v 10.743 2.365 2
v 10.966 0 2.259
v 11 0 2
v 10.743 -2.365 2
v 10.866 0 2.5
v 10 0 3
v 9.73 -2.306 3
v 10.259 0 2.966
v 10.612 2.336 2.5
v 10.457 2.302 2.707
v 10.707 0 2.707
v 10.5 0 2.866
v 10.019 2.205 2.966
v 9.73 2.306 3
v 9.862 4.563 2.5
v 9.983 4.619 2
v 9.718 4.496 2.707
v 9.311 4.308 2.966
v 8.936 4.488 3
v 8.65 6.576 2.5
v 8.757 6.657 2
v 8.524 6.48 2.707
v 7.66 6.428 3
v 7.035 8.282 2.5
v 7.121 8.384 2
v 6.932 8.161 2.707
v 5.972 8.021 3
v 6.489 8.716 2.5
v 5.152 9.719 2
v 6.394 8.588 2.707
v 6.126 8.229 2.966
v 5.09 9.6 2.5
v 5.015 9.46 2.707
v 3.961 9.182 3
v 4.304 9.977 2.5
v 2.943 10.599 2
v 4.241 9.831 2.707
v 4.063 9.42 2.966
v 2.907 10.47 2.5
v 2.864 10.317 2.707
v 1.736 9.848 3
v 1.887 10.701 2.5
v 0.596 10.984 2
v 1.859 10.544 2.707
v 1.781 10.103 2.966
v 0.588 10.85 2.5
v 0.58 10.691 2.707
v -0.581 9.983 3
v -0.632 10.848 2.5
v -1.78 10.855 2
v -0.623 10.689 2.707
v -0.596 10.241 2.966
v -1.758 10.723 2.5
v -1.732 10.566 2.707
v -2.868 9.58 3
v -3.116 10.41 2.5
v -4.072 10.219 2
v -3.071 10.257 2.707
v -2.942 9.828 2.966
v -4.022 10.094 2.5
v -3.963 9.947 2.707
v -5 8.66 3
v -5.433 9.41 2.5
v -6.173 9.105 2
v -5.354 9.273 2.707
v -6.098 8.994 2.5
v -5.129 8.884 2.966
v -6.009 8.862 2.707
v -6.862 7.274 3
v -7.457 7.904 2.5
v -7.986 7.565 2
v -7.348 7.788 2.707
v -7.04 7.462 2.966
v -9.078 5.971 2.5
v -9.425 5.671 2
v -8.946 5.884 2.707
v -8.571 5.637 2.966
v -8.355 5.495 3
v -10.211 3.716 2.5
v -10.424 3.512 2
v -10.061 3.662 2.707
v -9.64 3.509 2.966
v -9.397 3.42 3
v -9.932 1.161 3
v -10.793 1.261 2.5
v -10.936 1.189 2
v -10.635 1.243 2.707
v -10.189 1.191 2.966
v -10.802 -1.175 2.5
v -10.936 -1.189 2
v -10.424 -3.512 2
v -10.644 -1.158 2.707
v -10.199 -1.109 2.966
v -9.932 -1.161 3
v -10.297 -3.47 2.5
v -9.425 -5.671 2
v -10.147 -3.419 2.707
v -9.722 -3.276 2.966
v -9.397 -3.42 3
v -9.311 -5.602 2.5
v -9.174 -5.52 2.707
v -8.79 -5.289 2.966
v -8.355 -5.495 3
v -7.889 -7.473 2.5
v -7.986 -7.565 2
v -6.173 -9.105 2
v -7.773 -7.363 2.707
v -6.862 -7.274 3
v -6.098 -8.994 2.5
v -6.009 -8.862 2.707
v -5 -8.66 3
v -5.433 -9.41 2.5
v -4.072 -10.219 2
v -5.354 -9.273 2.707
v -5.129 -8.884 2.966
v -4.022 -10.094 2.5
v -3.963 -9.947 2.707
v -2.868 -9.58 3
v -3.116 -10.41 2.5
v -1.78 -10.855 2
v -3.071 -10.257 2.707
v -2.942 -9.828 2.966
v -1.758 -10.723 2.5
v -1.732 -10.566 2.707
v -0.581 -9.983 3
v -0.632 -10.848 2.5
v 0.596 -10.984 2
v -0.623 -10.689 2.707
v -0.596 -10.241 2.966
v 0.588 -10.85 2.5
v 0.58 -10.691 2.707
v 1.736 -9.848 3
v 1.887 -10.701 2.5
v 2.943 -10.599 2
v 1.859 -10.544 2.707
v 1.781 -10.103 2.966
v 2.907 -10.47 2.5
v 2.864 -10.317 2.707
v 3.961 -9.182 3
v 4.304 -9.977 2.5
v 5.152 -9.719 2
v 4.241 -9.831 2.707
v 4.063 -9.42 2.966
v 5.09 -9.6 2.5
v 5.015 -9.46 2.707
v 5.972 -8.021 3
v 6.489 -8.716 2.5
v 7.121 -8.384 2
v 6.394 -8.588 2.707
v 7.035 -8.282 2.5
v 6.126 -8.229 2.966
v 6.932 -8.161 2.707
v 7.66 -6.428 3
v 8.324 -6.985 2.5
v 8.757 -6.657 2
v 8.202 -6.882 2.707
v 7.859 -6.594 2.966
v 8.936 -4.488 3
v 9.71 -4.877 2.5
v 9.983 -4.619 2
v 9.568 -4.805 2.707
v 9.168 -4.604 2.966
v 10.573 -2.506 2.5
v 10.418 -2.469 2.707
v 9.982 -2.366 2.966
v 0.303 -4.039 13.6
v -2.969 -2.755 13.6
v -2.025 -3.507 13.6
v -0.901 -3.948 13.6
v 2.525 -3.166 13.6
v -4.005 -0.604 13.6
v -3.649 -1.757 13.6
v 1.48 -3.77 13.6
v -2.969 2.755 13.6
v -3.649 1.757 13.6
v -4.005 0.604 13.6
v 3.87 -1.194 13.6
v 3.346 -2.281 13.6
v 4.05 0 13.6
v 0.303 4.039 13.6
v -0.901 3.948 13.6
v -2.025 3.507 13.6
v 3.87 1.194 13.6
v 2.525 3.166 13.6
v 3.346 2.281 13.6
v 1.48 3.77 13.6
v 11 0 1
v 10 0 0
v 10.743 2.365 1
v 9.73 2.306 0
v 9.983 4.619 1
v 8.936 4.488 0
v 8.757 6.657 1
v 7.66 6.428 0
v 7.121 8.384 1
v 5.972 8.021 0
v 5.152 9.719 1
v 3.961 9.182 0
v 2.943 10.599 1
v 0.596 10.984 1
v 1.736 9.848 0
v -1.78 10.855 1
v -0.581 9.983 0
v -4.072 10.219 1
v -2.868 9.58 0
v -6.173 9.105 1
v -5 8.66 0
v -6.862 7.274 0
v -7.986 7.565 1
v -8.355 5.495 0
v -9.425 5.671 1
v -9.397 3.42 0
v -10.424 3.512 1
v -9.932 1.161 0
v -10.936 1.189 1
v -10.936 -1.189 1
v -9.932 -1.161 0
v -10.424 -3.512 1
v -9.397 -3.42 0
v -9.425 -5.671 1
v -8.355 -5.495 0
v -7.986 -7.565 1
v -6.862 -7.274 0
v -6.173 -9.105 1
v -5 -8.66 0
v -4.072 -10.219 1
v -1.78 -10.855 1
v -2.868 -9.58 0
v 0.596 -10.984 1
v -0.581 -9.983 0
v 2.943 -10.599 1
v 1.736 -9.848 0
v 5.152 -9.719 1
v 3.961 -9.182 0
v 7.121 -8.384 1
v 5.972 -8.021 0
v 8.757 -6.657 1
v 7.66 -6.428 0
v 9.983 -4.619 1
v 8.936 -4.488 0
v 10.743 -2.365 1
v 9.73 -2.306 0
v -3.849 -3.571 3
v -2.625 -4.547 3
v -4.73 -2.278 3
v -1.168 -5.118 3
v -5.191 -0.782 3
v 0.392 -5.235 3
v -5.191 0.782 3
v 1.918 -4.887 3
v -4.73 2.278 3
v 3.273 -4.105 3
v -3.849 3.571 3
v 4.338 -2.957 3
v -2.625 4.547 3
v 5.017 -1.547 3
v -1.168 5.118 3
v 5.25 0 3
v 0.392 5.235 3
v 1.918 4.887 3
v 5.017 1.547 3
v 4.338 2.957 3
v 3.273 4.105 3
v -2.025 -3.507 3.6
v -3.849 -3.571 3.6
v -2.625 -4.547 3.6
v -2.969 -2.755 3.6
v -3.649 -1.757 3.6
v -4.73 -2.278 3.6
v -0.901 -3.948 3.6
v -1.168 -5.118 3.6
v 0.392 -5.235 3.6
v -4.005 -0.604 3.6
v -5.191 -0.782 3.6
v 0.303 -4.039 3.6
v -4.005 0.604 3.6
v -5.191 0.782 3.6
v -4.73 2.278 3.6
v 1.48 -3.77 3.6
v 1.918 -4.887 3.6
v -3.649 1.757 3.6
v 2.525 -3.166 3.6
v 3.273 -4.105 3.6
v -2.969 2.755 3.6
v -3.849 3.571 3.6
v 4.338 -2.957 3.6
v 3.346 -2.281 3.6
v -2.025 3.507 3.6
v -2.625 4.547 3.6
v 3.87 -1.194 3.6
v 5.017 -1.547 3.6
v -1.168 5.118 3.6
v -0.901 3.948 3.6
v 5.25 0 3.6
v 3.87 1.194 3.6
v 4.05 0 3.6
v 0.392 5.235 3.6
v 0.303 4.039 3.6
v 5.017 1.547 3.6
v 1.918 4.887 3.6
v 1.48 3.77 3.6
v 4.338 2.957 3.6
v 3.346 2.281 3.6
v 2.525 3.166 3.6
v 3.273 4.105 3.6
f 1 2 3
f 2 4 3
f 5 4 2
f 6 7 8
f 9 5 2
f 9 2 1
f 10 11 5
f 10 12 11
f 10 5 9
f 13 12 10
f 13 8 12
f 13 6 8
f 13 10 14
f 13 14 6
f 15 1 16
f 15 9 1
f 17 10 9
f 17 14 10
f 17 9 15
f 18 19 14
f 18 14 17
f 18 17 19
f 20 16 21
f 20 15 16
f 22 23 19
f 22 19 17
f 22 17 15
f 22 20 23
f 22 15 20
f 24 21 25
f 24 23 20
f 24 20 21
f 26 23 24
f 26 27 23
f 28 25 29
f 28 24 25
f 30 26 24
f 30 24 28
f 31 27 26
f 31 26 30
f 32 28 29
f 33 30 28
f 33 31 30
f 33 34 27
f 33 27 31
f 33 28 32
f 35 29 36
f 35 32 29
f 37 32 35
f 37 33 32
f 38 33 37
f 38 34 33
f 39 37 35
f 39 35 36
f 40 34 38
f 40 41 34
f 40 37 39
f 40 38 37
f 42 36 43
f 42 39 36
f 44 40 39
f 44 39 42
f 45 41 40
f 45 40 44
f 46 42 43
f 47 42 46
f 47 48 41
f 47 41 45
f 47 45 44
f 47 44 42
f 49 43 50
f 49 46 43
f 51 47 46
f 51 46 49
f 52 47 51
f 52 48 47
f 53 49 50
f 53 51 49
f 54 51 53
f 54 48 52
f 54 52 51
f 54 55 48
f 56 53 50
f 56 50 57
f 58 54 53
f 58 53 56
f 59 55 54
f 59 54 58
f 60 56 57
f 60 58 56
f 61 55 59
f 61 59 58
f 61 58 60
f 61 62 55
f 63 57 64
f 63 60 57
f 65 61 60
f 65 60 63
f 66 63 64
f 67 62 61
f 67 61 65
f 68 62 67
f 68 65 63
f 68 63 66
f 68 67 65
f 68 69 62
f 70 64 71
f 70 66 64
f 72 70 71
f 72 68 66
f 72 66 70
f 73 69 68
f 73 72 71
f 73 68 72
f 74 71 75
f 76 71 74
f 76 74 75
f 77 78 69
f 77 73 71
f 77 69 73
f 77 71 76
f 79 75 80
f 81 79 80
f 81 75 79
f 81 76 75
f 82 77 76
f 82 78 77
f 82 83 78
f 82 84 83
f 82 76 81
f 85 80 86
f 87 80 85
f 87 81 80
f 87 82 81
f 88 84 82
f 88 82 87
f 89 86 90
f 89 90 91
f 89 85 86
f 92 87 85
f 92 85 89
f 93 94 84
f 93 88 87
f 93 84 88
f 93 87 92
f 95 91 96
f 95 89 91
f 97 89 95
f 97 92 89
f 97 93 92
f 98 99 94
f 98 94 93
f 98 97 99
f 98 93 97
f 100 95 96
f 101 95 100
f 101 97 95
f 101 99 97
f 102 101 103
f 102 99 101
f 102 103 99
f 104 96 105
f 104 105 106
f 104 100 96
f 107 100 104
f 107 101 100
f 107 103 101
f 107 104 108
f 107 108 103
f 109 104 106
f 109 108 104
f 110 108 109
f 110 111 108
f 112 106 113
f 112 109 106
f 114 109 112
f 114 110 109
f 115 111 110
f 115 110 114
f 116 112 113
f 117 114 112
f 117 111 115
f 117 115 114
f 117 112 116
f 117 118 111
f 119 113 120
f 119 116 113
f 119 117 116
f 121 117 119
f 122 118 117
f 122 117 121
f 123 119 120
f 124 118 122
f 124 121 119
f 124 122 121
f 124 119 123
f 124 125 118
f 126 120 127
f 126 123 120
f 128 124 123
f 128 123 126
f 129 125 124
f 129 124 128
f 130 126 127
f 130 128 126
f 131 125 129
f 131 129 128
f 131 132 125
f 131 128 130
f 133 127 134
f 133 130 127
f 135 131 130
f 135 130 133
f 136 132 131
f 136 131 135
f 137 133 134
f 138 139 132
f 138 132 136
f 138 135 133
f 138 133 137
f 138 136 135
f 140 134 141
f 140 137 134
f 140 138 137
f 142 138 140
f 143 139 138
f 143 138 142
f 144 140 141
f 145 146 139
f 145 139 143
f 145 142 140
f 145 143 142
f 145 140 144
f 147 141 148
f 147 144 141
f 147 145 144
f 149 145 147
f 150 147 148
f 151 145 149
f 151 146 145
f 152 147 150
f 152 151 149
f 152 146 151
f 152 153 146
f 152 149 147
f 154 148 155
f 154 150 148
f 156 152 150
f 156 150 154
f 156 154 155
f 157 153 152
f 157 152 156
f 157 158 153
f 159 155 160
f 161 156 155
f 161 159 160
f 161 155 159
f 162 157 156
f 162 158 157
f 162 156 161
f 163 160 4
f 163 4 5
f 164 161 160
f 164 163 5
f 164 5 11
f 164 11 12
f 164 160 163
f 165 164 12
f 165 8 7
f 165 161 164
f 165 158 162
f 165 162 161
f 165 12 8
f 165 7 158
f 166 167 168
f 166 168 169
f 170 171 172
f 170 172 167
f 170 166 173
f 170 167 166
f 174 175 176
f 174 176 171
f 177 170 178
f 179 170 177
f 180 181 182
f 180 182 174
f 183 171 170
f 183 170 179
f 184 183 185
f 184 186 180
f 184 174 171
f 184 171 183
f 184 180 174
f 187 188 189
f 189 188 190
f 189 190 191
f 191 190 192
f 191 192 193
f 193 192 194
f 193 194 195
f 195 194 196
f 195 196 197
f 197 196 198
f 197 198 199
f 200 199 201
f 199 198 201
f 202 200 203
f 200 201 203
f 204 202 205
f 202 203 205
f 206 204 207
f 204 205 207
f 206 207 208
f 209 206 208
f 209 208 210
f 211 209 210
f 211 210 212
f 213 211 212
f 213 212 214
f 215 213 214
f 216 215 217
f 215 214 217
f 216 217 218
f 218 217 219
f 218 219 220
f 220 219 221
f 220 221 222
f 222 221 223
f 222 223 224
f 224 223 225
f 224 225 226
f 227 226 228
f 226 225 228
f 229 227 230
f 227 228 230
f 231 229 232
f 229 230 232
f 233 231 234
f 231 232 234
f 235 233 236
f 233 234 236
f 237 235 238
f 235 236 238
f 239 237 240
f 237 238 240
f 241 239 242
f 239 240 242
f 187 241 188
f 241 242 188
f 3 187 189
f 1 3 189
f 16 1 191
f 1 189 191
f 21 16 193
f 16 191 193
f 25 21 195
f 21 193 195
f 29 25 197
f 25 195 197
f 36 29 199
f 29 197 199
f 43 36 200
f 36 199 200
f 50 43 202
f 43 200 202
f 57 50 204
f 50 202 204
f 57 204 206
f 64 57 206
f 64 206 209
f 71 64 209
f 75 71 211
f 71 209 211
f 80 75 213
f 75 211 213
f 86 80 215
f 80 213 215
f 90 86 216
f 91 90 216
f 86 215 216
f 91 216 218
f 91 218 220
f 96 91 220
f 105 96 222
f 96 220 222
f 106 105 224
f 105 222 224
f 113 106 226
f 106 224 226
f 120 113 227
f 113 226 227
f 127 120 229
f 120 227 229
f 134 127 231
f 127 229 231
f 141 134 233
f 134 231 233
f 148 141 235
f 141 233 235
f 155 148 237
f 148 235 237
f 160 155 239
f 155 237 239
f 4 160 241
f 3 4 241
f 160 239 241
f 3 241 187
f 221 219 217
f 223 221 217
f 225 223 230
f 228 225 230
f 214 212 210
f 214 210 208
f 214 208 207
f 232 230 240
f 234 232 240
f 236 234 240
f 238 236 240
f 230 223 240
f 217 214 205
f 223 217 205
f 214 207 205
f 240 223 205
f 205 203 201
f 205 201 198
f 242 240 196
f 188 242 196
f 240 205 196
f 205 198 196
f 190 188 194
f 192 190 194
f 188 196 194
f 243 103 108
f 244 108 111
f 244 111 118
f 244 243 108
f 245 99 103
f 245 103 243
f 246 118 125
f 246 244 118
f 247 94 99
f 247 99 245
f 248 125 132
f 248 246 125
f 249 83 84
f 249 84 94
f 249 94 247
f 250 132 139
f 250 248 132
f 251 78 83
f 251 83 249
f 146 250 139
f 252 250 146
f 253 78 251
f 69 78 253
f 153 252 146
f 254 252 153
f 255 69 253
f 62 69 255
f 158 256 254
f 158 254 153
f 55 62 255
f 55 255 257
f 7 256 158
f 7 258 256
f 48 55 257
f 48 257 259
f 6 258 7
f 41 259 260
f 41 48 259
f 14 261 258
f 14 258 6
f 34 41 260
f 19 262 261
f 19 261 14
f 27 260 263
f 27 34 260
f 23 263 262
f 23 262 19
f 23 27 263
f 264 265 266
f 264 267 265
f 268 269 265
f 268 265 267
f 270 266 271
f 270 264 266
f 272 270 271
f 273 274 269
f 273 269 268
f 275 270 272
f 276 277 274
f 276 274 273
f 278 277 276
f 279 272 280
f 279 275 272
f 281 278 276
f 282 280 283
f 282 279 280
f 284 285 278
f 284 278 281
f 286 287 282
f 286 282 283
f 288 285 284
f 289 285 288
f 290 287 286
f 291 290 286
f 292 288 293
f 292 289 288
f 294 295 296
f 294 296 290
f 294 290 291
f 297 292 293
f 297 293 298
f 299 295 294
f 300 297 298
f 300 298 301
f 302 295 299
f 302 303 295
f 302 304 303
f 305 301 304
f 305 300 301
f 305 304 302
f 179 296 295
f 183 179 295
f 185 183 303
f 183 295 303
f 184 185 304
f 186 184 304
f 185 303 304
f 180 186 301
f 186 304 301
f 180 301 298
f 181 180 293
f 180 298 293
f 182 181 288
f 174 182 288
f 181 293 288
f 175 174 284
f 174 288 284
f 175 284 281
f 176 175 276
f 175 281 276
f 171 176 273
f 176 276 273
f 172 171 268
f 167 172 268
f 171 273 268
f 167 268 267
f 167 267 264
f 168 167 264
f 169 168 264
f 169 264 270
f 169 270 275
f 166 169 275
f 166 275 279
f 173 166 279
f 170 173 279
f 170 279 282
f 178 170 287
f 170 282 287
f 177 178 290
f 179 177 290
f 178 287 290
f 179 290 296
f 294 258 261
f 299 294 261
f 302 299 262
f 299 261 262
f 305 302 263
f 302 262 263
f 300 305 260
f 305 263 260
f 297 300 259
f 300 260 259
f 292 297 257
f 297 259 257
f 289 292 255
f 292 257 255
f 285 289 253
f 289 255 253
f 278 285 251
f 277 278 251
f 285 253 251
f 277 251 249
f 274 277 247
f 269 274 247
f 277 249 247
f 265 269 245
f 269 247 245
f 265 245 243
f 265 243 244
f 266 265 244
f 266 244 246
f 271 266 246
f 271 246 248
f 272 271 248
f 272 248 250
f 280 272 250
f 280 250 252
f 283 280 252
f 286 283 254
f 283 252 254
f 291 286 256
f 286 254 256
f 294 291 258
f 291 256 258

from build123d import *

# Parameters (mm, degrees)
F0_R     = 11
F1_DEPTH = 3
F2_R     = 5.25
F3_DEPTH = 0.6
F4_R     = 4.05
F5_DEPTH = 10
F6_SIZE  = 1
F7_R     = 1


with BuildPart() as f1:
    # F0 (on Top) → F1 (new body)
    with BuildSketch(Plane.XY):
        Circle(F0_R)
    extrude(amount=F1_DEPTH)

    # F2 (on face) → F3 (join)
    with BuildSketch(Plane.XY.offset(3)):
        Circle(F2_R)
    extrude(amount=F3_DEPTH)

    # F4 (on face) → F5 (join)
    with BuildSketch(Plane.XY.offset(3.6)):
        Circle(F4_R)
    extrude(amount=F5_DEPTH)

    # F6
    f6_edges = [f1.edges().sort_by_distance(p)[0] for p in [
        (-11, 0, 0),
    ]]
    chamfer(f6_edges, length=F6_SIZE)

    # F7
    f7_edges = [f1.edges().sort_by_distance(p)[0] for p in [
        (-11, 0, 3),
    ]]
    fillet(f7_edges, radius=F7_R)


solid = f1.part
